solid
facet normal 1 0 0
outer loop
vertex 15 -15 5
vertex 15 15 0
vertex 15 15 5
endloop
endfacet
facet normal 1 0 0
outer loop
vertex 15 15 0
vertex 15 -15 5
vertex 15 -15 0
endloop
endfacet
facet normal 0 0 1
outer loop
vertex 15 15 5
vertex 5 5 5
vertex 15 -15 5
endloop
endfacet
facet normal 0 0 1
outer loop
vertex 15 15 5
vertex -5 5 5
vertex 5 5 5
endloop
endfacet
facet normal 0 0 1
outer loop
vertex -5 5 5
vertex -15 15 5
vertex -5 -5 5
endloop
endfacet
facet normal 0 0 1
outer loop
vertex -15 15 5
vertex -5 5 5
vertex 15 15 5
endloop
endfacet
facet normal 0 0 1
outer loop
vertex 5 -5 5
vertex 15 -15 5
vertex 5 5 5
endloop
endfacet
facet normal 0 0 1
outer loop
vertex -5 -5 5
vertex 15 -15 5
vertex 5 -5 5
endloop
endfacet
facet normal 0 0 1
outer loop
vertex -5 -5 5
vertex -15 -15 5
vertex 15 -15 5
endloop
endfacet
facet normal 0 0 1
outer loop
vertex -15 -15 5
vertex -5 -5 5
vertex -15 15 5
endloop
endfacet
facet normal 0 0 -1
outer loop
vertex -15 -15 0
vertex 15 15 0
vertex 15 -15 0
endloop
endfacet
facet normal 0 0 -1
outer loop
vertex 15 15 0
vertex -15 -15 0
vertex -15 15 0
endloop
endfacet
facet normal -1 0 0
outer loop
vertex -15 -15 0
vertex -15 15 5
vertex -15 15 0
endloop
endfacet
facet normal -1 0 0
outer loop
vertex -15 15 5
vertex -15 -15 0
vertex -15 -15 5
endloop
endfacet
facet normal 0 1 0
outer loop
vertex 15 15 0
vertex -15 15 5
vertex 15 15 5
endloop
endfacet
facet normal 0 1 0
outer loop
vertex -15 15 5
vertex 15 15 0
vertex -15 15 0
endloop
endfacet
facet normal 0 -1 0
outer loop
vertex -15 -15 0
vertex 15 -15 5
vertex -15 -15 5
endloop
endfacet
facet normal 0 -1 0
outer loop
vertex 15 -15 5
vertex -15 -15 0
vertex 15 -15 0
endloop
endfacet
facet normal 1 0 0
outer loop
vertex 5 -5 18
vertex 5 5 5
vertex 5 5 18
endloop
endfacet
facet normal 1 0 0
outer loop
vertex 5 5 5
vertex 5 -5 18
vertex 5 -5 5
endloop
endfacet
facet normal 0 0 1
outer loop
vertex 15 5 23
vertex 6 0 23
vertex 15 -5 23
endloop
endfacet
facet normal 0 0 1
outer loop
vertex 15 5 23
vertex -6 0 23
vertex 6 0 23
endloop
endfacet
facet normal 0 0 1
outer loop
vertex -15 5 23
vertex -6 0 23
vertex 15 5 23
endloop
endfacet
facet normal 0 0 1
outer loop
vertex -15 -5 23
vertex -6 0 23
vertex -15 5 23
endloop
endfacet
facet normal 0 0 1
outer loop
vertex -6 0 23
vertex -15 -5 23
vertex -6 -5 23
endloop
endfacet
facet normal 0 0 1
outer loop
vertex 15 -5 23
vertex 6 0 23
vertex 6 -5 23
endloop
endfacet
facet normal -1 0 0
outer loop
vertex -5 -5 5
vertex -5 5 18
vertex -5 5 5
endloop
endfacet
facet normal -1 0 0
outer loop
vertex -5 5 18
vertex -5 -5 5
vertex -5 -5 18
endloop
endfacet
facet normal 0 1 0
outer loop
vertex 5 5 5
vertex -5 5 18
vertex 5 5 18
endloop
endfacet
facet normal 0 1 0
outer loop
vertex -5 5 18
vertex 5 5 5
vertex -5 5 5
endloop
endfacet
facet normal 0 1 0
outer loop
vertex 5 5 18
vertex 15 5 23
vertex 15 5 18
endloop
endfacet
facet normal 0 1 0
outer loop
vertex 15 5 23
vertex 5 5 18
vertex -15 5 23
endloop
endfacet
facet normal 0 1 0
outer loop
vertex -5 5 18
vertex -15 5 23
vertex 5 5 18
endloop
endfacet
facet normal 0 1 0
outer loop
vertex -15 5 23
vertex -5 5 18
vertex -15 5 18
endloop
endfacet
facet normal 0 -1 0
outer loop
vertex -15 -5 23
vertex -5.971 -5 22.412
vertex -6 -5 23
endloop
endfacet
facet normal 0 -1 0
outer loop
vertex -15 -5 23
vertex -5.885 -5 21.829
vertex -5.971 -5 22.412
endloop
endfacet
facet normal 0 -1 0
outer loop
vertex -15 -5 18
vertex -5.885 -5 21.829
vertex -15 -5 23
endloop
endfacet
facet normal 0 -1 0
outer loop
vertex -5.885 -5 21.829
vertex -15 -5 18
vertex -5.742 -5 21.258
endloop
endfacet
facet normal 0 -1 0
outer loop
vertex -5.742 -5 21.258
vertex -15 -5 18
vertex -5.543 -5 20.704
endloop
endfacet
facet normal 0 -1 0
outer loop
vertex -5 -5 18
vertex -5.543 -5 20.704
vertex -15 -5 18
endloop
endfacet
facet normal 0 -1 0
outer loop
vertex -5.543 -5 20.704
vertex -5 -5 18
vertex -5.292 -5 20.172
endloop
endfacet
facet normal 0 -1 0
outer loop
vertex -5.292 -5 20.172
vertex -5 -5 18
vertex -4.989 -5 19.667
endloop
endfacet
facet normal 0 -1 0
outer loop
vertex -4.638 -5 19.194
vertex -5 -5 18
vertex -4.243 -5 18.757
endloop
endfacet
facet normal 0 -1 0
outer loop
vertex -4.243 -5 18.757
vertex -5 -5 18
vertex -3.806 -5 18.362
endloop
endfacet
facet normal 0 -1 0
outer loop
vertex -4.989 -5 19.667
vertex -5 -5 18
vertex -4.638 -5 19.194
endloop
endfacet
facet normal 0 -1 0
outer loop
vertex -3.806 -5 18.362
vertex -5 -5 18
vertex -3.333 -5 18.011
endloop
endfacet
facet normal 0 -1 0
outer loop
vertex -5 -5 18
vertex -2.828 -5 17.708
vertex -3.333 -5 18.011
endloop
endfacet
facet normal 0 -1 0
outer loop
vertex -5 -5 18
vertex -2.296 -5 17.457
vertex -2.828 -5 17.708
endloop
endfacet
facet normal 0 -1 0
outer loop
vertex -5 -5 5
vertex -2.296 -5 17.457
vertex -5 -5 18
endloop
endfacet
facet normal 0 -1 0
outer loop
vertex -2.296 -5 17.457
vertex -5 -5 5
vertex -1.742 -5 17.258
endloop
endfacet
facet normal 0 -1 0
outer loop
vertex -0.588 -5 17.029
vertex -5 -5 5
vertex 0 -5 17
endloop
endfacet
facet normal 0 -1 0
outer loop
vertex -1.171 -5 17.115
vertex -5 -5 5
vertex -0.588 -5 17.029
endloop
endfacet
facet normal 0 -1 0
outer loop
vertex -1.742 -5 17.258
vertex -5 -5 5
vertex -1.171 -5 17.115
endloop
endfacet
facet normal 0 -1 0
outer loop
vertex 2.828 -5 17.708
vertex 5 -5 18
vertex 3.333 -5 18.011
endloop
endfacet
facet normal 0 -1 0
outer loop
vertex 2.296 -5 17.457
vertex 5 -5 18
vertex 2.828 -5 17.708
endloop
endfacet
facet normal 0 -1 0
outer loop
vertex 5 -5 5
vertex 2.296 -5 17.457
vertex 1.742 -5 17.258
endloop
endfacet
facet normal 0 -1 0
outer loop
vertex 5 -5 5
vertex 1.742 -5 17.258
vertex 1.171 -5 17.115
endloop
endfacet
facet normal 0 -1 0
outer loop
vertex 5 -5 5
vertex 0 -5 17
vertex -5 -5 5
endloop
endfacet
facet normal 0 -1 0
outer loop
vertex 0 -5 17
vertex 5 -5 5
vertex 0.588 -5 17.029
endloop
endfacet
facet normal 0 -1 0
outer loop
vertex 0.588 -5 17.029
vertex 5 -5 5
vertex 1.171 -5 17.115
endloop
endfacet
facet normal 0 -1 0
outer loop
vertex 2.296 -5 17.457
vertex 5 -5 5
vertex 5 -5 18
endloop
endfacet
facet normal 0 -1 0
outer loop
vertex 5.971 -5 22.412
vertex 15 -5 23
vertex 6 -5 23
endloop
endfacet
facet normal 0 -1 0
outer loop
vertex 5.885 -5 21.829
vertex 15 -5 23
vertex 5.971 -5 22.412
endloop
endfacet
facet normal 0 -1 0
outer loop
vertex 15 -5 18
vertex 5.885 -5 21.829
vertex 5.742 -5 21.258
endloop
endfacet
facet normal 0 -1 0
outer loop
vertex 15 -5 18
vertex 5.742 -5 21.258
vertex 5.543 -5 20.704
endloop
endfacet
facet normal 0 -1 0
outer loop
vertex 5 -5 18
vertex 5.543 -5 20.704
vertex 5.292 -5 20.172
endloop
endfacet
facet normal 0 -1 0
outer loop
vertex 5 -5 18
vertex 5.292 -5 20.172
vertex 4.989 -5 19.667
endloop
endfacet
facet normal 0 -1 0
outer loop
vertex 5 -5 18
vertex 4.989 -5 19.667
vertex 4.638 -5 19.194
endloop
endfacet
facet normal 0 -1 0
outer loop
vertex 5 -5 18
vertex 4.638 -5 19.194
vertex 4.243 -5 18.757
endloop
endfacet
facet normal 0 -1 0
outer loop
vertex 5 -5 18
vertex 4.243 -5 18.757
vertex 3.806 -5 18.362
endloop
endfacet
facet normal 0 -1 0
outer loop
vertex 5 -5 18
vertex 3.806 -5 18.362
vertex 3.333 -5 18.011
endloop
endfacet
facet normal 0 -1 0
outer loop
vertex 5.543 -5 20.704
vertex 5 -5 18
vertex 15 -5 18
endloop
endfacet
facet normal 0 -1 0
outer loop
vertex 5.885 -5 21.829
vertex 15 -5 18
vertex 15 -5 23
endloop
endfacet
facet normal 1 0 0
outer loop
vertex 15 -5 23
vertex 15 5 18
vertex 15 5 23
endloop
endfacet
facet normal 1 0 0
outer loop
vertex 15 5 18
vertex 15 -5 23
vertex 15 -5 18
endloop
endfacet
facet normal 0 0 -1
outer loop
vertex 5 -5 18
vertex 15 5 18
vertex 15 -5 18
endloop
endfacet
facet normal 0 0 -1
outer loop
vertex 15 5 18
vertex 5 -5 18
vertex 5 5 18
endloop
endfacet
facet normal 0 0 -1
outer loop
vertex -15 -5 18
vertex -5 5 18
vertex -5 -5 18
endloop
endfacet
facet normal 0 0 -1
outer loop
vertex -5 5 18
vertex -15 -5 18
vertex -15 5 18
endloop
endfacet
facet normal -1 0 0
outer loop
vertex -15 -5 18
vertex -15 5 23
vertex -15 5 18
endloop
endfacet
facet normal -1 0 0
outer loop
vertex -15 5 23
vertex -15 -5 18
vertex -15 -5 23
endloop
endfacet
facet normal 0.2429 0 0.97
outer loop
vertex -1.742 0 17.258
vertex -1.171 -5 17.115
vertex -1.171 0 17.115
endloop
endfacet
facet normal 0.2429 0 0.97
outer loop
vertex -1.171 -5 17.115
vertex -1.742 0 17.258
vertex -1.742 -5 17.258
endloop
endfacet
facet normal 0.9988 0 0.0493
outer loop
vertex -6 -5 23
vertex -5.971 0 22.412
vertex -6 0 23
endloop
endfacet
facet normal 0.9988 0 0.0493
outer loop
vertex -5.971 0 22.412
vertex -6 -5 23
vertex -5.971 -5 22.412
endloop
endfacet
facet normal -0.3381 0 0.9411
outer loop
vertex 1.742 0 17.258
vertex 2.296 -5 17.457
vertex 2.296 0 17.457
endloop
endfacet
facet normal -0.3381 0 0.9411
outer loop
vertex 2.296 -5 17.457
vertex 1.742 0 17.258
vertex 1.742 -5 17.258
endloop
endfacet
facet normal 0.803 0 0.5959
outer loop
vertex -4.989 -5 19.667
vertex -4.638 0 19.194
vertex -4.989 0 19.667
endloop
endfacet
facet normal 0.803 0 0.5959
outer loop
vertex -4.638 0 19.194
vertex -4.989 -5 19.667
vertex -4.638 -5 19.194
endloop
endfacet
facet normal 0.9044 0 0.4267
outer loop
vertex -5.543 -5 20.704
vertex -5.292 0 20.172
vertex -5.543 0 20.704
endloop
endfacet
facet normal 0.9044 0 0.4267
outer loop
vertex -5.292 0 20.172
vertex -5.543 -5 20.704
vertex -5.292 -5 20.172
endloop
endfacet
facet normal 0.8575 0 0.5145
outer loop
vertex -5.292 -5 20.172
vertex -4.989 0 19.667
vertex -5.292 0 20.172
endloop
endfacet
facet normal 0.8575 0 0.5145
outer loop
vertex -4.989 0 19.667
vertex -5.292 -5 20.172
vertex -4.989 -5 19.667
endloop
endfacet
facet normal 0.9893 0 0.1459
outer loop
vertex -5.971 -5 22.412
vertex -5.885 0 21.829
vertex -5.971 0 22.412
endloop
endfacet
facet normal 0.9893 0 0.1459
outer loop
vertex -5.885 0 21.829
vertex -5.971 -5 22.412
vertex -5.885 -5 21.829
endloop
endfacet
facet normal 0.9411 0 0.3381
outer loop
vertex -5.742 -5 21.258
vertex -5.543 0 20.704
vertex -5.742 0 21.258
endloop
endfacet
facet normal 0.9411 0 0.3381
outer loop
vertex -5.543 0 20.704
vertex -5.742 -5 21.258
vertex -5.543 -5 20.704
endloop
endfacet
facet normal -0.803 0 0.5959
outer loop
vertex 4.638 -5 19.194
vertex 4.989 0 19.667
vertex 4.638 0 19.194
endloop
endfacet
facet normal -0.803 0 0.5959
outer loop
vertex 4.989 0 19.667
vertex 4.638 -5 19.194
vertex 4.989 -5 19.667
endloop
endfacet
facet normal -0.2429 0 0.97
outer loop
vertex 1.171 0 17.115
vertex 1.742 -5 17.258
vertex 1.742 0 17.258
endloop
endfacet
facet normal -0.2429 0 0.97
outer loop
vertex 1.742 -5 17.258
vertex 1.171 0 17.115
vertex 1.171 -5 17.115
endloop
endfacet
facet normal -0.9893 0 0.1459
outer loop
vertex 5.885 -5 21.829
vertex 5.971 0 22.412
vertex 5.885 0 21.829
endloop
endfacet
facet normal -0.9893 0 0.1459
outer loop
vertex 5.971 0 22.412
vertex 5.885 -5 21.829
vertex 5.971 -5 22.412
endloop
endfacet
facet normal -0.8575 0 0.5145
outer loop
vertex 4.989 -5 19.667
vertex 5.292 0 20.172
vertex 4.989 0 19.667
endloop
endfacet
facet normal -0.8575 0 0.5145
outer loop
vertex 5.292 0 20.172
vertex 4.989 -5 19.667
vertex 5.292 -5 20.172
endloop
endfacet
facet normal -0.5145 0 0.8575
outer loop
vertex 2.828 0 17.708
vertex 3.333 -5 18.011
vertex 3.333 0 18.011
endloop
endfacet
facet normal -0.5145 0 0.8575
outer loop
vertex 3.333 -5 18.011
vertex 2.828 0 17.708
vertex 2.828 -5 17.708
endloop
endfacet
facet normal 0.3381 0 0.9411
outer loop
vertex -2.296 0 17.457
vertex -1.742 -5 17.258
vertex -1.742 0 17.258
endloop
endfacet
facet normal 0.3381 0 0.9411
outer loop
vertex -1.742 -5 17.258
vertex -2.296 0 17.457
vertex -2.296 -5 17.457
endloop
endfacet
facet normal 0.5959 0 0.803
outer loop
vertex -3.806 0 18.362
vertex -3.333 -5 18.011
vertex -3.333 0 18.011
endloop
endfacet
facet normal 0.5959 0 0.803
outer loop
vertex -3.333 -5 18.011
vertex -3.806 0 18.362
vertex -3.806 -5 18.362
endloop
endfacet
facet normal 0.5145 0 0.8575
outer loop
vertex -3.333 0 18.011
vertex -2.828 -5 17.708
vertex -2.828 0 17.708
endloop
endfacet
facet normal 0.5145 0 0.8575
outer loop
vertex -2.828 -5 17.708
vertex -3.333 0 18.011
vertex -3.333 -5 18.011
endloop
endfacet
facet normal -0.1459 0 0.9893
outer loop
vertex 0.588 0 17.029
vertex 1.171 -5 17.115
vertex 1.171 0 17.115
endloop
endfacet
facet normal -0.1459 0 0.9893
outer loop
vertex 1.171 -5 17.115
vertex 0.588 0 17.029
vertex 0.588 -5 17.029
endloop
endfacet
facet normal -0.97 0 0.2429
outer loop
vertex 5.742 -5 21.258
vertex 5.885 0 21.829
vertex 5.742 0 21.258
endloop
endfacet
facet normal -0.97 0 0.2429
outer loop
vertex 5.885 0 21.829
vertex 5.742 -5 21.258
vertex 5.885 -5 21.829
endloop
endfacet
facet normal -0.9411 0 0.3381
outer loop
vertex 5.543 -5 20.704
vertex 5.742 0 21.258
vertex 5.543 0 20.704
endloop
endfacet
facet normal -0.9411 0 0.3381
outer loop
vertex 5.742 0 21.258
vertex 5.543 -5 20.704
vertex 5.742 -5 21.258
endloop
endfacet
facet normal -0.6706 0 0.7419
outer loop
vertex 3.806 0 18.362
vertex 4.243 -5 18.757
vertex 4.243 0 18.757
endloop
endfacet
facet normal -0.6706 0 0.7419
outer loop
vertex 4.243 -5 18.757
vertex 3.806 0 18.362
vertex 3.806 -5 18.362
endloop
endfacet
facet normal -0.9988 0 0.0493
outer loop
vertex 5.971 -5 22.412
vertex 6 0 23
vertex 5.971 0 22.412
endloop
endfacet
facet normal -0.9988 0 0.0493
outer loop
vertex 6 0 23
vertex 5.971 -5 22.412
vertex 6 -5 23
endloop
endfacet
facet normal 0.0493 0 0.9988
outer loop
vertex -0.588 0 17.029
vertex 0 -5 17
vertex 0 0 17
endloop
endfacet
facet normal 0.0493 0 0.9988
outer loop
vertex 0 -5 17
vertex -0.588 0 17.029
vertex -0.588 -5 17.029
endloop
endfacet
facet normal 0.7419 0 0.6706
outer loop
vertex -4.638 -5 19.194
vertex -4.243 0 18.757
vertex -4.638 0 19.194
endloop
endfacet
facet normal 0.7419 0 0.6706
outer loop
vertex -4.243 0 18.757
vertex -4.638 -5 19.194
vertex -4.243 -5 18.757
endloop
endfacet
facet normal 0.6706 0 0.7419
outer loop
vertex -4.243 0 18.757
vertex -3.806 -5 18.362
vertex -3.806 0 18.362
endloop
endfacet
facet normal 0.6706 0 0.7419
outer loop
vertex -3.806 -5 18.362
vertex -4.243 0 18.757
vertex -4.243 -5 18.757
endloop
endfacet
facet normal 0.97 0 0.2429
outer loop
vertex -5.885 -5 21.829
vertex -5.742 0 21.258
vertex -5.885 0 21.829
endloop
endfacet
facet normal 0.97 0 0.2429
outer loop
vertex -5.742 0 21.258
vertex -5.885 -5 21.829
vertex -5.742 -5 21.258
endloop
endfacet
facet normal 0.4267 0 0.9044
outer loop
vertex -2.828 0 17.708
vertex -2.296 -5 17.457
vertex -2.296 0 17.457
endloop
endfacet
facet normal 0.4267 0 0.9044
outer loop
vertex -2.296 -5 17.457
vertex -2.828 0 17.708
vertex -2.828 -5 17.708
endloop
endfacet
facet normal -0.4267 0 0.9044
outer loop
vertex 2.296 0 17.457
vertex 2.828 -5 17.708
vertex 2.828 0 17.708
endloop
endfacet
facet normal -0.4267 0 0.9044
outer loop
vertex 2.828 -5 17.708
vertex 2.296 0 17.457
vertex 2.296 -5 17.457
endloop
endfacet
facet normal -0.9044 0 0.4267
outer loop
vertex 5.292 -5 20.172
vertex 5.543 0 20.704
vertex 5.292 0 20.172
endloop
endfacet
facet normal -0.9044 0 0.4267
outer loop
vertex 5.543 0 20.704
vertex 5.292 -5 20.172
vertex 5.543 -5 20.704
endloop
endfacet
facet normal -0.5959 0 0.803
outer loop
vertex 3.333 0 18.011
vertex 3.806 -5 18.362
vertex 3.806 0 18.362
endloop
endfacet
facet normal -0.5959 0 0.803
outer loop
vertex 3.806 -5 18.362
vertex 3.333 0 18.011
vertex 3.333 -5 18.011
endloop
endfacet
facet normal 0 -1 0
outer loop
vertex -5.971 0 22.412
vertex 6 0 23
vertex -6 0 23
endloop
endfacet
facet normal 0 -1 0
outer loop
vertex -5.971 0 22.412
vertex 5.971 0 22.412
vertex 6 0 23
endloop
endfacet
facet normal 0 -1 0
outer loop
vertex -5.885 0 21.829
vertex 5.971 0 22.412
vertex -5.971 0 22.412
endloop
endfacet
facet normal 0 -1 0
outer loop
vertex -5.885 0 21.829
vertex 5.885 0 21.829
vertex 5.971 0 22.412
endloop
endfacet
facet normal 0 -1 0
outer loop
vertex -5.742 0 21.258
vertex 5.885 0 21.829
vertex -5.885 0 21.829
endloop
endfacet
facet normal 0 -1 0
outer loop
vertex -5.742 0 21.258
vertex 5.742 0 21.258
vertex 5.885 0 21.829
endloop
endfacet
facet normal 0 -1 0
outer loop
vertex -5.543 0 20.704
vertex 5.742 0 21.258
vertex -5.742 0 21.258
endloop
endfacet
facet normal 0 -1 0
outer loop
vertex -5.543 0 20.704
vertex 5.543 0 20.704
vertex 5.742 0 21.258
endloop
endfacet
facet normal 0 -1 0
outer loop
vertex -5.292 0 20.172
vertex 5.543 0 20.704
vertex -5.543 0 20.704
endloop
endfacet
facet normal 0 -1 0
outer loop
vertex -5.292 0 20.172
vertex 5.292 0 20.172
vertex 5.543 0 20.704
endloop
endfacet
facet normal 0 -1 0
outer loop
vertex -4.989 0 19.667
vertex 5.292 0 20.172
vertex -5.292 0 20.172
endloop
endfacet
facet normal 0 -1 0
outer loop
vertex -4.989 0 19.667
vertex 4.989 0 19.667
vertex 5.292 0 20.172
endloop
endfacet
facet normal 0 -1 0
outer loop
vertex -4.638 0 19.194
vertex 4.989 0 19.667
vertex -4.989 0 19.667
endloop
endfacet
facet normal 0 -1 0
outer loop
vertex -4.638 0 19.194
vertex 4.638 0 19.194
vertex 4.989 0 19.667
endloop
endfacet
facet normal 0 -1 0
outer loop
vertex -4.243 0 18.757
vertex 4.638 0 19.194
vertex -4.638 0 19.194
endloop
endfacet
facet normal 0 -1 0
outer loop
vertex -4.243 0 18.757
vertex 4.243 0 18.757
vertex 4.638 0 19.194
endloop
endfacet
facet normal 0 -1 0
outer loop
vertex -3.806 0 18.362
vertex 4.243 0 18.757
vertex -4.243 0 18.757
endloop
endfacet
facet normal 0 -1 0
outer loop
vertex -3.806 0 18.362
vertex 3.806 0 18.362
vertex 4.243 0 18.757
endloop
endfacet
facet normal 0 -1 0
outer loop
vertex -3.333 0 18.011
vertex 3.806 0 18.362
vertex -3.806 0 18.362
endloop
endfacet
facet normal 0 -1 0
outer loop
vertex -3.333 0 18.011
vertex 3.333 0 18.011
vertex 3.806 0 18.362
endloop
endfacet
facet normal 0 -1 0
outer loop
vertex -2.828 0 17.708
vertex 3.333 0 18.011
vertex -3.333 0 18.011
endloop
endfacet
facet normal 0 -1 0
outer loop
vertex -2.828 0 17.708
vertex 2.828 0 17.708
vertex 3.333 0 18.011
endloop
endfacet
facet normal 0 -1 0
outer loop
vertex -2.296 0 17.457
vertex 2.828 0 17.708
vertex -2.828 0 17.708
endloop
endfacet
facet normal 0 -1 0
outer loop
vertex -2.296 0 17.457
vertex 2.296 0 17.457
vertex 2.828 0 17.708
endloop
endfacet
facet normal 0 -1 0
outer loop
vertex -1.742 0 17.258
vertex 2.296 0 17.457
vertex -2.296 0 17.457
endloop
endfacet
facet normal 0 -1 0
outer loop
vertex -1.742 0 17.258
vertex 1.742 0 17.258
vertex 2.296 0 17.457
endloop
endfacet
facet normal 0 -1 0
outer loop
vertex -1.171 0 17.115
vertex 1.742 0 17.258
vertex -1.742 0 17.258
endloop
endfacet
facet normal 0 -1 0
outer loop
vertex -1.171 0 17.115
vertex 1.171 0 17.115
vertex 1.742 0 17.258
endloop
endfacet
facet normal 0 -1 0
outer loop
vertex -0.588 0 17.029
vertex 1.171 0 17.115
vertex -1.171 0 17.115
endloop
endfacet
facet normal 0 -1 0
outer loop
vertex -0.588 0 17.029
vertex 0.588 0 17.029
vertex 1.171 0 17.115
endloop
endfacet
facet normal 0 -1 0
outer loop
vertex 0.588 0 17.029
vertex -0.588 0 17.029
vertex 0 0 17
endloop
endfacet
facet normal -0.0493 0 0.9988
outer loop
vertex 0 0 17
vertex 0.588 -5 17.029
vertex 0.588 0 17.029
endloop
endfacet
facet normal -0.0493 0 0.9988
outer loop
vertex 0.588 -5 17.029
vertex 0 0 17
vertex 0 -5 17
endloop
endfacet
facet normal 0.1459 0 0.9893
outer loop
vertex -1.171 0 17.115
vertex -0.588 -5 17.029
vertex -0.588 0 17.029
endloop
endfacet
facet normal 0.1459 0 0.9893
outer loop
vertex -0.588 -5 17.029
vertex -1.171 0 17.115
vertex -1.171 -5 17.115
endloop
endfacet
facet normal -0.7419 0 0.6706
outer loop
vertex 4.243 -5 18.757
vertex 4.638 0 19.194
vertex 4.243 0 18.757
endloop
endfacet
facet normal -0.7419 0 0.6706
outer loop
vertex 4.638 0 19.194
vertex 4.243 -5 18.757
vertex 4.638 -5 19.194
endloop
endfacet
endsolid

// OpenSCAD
module shaft_support_bracket() {
    difference() {
        union() {
            // Base block
            translate([-15, -15, 0])
                cube([30, 30, 5]);
            
            // Vertical support
            translate([-5, -5, 5])
                cube([10, 10, 18]);
            
            // Horizontal support
            translate([-15, -5, 18])
                cube([30, 10, 5]);
            
            // Cylinder for rod
            translate([0, 0, 23])
                rotate([90, 0, 0])
                cylinder(h=10, d=12, $fn=64);
        }
        
        // Hole for rod
        translate([0, 0, 23])
            rotate([90, 0, 0])
            cylinder(h=10, d=12, $fn=64);
    }
}

shaft_support_bracket();
